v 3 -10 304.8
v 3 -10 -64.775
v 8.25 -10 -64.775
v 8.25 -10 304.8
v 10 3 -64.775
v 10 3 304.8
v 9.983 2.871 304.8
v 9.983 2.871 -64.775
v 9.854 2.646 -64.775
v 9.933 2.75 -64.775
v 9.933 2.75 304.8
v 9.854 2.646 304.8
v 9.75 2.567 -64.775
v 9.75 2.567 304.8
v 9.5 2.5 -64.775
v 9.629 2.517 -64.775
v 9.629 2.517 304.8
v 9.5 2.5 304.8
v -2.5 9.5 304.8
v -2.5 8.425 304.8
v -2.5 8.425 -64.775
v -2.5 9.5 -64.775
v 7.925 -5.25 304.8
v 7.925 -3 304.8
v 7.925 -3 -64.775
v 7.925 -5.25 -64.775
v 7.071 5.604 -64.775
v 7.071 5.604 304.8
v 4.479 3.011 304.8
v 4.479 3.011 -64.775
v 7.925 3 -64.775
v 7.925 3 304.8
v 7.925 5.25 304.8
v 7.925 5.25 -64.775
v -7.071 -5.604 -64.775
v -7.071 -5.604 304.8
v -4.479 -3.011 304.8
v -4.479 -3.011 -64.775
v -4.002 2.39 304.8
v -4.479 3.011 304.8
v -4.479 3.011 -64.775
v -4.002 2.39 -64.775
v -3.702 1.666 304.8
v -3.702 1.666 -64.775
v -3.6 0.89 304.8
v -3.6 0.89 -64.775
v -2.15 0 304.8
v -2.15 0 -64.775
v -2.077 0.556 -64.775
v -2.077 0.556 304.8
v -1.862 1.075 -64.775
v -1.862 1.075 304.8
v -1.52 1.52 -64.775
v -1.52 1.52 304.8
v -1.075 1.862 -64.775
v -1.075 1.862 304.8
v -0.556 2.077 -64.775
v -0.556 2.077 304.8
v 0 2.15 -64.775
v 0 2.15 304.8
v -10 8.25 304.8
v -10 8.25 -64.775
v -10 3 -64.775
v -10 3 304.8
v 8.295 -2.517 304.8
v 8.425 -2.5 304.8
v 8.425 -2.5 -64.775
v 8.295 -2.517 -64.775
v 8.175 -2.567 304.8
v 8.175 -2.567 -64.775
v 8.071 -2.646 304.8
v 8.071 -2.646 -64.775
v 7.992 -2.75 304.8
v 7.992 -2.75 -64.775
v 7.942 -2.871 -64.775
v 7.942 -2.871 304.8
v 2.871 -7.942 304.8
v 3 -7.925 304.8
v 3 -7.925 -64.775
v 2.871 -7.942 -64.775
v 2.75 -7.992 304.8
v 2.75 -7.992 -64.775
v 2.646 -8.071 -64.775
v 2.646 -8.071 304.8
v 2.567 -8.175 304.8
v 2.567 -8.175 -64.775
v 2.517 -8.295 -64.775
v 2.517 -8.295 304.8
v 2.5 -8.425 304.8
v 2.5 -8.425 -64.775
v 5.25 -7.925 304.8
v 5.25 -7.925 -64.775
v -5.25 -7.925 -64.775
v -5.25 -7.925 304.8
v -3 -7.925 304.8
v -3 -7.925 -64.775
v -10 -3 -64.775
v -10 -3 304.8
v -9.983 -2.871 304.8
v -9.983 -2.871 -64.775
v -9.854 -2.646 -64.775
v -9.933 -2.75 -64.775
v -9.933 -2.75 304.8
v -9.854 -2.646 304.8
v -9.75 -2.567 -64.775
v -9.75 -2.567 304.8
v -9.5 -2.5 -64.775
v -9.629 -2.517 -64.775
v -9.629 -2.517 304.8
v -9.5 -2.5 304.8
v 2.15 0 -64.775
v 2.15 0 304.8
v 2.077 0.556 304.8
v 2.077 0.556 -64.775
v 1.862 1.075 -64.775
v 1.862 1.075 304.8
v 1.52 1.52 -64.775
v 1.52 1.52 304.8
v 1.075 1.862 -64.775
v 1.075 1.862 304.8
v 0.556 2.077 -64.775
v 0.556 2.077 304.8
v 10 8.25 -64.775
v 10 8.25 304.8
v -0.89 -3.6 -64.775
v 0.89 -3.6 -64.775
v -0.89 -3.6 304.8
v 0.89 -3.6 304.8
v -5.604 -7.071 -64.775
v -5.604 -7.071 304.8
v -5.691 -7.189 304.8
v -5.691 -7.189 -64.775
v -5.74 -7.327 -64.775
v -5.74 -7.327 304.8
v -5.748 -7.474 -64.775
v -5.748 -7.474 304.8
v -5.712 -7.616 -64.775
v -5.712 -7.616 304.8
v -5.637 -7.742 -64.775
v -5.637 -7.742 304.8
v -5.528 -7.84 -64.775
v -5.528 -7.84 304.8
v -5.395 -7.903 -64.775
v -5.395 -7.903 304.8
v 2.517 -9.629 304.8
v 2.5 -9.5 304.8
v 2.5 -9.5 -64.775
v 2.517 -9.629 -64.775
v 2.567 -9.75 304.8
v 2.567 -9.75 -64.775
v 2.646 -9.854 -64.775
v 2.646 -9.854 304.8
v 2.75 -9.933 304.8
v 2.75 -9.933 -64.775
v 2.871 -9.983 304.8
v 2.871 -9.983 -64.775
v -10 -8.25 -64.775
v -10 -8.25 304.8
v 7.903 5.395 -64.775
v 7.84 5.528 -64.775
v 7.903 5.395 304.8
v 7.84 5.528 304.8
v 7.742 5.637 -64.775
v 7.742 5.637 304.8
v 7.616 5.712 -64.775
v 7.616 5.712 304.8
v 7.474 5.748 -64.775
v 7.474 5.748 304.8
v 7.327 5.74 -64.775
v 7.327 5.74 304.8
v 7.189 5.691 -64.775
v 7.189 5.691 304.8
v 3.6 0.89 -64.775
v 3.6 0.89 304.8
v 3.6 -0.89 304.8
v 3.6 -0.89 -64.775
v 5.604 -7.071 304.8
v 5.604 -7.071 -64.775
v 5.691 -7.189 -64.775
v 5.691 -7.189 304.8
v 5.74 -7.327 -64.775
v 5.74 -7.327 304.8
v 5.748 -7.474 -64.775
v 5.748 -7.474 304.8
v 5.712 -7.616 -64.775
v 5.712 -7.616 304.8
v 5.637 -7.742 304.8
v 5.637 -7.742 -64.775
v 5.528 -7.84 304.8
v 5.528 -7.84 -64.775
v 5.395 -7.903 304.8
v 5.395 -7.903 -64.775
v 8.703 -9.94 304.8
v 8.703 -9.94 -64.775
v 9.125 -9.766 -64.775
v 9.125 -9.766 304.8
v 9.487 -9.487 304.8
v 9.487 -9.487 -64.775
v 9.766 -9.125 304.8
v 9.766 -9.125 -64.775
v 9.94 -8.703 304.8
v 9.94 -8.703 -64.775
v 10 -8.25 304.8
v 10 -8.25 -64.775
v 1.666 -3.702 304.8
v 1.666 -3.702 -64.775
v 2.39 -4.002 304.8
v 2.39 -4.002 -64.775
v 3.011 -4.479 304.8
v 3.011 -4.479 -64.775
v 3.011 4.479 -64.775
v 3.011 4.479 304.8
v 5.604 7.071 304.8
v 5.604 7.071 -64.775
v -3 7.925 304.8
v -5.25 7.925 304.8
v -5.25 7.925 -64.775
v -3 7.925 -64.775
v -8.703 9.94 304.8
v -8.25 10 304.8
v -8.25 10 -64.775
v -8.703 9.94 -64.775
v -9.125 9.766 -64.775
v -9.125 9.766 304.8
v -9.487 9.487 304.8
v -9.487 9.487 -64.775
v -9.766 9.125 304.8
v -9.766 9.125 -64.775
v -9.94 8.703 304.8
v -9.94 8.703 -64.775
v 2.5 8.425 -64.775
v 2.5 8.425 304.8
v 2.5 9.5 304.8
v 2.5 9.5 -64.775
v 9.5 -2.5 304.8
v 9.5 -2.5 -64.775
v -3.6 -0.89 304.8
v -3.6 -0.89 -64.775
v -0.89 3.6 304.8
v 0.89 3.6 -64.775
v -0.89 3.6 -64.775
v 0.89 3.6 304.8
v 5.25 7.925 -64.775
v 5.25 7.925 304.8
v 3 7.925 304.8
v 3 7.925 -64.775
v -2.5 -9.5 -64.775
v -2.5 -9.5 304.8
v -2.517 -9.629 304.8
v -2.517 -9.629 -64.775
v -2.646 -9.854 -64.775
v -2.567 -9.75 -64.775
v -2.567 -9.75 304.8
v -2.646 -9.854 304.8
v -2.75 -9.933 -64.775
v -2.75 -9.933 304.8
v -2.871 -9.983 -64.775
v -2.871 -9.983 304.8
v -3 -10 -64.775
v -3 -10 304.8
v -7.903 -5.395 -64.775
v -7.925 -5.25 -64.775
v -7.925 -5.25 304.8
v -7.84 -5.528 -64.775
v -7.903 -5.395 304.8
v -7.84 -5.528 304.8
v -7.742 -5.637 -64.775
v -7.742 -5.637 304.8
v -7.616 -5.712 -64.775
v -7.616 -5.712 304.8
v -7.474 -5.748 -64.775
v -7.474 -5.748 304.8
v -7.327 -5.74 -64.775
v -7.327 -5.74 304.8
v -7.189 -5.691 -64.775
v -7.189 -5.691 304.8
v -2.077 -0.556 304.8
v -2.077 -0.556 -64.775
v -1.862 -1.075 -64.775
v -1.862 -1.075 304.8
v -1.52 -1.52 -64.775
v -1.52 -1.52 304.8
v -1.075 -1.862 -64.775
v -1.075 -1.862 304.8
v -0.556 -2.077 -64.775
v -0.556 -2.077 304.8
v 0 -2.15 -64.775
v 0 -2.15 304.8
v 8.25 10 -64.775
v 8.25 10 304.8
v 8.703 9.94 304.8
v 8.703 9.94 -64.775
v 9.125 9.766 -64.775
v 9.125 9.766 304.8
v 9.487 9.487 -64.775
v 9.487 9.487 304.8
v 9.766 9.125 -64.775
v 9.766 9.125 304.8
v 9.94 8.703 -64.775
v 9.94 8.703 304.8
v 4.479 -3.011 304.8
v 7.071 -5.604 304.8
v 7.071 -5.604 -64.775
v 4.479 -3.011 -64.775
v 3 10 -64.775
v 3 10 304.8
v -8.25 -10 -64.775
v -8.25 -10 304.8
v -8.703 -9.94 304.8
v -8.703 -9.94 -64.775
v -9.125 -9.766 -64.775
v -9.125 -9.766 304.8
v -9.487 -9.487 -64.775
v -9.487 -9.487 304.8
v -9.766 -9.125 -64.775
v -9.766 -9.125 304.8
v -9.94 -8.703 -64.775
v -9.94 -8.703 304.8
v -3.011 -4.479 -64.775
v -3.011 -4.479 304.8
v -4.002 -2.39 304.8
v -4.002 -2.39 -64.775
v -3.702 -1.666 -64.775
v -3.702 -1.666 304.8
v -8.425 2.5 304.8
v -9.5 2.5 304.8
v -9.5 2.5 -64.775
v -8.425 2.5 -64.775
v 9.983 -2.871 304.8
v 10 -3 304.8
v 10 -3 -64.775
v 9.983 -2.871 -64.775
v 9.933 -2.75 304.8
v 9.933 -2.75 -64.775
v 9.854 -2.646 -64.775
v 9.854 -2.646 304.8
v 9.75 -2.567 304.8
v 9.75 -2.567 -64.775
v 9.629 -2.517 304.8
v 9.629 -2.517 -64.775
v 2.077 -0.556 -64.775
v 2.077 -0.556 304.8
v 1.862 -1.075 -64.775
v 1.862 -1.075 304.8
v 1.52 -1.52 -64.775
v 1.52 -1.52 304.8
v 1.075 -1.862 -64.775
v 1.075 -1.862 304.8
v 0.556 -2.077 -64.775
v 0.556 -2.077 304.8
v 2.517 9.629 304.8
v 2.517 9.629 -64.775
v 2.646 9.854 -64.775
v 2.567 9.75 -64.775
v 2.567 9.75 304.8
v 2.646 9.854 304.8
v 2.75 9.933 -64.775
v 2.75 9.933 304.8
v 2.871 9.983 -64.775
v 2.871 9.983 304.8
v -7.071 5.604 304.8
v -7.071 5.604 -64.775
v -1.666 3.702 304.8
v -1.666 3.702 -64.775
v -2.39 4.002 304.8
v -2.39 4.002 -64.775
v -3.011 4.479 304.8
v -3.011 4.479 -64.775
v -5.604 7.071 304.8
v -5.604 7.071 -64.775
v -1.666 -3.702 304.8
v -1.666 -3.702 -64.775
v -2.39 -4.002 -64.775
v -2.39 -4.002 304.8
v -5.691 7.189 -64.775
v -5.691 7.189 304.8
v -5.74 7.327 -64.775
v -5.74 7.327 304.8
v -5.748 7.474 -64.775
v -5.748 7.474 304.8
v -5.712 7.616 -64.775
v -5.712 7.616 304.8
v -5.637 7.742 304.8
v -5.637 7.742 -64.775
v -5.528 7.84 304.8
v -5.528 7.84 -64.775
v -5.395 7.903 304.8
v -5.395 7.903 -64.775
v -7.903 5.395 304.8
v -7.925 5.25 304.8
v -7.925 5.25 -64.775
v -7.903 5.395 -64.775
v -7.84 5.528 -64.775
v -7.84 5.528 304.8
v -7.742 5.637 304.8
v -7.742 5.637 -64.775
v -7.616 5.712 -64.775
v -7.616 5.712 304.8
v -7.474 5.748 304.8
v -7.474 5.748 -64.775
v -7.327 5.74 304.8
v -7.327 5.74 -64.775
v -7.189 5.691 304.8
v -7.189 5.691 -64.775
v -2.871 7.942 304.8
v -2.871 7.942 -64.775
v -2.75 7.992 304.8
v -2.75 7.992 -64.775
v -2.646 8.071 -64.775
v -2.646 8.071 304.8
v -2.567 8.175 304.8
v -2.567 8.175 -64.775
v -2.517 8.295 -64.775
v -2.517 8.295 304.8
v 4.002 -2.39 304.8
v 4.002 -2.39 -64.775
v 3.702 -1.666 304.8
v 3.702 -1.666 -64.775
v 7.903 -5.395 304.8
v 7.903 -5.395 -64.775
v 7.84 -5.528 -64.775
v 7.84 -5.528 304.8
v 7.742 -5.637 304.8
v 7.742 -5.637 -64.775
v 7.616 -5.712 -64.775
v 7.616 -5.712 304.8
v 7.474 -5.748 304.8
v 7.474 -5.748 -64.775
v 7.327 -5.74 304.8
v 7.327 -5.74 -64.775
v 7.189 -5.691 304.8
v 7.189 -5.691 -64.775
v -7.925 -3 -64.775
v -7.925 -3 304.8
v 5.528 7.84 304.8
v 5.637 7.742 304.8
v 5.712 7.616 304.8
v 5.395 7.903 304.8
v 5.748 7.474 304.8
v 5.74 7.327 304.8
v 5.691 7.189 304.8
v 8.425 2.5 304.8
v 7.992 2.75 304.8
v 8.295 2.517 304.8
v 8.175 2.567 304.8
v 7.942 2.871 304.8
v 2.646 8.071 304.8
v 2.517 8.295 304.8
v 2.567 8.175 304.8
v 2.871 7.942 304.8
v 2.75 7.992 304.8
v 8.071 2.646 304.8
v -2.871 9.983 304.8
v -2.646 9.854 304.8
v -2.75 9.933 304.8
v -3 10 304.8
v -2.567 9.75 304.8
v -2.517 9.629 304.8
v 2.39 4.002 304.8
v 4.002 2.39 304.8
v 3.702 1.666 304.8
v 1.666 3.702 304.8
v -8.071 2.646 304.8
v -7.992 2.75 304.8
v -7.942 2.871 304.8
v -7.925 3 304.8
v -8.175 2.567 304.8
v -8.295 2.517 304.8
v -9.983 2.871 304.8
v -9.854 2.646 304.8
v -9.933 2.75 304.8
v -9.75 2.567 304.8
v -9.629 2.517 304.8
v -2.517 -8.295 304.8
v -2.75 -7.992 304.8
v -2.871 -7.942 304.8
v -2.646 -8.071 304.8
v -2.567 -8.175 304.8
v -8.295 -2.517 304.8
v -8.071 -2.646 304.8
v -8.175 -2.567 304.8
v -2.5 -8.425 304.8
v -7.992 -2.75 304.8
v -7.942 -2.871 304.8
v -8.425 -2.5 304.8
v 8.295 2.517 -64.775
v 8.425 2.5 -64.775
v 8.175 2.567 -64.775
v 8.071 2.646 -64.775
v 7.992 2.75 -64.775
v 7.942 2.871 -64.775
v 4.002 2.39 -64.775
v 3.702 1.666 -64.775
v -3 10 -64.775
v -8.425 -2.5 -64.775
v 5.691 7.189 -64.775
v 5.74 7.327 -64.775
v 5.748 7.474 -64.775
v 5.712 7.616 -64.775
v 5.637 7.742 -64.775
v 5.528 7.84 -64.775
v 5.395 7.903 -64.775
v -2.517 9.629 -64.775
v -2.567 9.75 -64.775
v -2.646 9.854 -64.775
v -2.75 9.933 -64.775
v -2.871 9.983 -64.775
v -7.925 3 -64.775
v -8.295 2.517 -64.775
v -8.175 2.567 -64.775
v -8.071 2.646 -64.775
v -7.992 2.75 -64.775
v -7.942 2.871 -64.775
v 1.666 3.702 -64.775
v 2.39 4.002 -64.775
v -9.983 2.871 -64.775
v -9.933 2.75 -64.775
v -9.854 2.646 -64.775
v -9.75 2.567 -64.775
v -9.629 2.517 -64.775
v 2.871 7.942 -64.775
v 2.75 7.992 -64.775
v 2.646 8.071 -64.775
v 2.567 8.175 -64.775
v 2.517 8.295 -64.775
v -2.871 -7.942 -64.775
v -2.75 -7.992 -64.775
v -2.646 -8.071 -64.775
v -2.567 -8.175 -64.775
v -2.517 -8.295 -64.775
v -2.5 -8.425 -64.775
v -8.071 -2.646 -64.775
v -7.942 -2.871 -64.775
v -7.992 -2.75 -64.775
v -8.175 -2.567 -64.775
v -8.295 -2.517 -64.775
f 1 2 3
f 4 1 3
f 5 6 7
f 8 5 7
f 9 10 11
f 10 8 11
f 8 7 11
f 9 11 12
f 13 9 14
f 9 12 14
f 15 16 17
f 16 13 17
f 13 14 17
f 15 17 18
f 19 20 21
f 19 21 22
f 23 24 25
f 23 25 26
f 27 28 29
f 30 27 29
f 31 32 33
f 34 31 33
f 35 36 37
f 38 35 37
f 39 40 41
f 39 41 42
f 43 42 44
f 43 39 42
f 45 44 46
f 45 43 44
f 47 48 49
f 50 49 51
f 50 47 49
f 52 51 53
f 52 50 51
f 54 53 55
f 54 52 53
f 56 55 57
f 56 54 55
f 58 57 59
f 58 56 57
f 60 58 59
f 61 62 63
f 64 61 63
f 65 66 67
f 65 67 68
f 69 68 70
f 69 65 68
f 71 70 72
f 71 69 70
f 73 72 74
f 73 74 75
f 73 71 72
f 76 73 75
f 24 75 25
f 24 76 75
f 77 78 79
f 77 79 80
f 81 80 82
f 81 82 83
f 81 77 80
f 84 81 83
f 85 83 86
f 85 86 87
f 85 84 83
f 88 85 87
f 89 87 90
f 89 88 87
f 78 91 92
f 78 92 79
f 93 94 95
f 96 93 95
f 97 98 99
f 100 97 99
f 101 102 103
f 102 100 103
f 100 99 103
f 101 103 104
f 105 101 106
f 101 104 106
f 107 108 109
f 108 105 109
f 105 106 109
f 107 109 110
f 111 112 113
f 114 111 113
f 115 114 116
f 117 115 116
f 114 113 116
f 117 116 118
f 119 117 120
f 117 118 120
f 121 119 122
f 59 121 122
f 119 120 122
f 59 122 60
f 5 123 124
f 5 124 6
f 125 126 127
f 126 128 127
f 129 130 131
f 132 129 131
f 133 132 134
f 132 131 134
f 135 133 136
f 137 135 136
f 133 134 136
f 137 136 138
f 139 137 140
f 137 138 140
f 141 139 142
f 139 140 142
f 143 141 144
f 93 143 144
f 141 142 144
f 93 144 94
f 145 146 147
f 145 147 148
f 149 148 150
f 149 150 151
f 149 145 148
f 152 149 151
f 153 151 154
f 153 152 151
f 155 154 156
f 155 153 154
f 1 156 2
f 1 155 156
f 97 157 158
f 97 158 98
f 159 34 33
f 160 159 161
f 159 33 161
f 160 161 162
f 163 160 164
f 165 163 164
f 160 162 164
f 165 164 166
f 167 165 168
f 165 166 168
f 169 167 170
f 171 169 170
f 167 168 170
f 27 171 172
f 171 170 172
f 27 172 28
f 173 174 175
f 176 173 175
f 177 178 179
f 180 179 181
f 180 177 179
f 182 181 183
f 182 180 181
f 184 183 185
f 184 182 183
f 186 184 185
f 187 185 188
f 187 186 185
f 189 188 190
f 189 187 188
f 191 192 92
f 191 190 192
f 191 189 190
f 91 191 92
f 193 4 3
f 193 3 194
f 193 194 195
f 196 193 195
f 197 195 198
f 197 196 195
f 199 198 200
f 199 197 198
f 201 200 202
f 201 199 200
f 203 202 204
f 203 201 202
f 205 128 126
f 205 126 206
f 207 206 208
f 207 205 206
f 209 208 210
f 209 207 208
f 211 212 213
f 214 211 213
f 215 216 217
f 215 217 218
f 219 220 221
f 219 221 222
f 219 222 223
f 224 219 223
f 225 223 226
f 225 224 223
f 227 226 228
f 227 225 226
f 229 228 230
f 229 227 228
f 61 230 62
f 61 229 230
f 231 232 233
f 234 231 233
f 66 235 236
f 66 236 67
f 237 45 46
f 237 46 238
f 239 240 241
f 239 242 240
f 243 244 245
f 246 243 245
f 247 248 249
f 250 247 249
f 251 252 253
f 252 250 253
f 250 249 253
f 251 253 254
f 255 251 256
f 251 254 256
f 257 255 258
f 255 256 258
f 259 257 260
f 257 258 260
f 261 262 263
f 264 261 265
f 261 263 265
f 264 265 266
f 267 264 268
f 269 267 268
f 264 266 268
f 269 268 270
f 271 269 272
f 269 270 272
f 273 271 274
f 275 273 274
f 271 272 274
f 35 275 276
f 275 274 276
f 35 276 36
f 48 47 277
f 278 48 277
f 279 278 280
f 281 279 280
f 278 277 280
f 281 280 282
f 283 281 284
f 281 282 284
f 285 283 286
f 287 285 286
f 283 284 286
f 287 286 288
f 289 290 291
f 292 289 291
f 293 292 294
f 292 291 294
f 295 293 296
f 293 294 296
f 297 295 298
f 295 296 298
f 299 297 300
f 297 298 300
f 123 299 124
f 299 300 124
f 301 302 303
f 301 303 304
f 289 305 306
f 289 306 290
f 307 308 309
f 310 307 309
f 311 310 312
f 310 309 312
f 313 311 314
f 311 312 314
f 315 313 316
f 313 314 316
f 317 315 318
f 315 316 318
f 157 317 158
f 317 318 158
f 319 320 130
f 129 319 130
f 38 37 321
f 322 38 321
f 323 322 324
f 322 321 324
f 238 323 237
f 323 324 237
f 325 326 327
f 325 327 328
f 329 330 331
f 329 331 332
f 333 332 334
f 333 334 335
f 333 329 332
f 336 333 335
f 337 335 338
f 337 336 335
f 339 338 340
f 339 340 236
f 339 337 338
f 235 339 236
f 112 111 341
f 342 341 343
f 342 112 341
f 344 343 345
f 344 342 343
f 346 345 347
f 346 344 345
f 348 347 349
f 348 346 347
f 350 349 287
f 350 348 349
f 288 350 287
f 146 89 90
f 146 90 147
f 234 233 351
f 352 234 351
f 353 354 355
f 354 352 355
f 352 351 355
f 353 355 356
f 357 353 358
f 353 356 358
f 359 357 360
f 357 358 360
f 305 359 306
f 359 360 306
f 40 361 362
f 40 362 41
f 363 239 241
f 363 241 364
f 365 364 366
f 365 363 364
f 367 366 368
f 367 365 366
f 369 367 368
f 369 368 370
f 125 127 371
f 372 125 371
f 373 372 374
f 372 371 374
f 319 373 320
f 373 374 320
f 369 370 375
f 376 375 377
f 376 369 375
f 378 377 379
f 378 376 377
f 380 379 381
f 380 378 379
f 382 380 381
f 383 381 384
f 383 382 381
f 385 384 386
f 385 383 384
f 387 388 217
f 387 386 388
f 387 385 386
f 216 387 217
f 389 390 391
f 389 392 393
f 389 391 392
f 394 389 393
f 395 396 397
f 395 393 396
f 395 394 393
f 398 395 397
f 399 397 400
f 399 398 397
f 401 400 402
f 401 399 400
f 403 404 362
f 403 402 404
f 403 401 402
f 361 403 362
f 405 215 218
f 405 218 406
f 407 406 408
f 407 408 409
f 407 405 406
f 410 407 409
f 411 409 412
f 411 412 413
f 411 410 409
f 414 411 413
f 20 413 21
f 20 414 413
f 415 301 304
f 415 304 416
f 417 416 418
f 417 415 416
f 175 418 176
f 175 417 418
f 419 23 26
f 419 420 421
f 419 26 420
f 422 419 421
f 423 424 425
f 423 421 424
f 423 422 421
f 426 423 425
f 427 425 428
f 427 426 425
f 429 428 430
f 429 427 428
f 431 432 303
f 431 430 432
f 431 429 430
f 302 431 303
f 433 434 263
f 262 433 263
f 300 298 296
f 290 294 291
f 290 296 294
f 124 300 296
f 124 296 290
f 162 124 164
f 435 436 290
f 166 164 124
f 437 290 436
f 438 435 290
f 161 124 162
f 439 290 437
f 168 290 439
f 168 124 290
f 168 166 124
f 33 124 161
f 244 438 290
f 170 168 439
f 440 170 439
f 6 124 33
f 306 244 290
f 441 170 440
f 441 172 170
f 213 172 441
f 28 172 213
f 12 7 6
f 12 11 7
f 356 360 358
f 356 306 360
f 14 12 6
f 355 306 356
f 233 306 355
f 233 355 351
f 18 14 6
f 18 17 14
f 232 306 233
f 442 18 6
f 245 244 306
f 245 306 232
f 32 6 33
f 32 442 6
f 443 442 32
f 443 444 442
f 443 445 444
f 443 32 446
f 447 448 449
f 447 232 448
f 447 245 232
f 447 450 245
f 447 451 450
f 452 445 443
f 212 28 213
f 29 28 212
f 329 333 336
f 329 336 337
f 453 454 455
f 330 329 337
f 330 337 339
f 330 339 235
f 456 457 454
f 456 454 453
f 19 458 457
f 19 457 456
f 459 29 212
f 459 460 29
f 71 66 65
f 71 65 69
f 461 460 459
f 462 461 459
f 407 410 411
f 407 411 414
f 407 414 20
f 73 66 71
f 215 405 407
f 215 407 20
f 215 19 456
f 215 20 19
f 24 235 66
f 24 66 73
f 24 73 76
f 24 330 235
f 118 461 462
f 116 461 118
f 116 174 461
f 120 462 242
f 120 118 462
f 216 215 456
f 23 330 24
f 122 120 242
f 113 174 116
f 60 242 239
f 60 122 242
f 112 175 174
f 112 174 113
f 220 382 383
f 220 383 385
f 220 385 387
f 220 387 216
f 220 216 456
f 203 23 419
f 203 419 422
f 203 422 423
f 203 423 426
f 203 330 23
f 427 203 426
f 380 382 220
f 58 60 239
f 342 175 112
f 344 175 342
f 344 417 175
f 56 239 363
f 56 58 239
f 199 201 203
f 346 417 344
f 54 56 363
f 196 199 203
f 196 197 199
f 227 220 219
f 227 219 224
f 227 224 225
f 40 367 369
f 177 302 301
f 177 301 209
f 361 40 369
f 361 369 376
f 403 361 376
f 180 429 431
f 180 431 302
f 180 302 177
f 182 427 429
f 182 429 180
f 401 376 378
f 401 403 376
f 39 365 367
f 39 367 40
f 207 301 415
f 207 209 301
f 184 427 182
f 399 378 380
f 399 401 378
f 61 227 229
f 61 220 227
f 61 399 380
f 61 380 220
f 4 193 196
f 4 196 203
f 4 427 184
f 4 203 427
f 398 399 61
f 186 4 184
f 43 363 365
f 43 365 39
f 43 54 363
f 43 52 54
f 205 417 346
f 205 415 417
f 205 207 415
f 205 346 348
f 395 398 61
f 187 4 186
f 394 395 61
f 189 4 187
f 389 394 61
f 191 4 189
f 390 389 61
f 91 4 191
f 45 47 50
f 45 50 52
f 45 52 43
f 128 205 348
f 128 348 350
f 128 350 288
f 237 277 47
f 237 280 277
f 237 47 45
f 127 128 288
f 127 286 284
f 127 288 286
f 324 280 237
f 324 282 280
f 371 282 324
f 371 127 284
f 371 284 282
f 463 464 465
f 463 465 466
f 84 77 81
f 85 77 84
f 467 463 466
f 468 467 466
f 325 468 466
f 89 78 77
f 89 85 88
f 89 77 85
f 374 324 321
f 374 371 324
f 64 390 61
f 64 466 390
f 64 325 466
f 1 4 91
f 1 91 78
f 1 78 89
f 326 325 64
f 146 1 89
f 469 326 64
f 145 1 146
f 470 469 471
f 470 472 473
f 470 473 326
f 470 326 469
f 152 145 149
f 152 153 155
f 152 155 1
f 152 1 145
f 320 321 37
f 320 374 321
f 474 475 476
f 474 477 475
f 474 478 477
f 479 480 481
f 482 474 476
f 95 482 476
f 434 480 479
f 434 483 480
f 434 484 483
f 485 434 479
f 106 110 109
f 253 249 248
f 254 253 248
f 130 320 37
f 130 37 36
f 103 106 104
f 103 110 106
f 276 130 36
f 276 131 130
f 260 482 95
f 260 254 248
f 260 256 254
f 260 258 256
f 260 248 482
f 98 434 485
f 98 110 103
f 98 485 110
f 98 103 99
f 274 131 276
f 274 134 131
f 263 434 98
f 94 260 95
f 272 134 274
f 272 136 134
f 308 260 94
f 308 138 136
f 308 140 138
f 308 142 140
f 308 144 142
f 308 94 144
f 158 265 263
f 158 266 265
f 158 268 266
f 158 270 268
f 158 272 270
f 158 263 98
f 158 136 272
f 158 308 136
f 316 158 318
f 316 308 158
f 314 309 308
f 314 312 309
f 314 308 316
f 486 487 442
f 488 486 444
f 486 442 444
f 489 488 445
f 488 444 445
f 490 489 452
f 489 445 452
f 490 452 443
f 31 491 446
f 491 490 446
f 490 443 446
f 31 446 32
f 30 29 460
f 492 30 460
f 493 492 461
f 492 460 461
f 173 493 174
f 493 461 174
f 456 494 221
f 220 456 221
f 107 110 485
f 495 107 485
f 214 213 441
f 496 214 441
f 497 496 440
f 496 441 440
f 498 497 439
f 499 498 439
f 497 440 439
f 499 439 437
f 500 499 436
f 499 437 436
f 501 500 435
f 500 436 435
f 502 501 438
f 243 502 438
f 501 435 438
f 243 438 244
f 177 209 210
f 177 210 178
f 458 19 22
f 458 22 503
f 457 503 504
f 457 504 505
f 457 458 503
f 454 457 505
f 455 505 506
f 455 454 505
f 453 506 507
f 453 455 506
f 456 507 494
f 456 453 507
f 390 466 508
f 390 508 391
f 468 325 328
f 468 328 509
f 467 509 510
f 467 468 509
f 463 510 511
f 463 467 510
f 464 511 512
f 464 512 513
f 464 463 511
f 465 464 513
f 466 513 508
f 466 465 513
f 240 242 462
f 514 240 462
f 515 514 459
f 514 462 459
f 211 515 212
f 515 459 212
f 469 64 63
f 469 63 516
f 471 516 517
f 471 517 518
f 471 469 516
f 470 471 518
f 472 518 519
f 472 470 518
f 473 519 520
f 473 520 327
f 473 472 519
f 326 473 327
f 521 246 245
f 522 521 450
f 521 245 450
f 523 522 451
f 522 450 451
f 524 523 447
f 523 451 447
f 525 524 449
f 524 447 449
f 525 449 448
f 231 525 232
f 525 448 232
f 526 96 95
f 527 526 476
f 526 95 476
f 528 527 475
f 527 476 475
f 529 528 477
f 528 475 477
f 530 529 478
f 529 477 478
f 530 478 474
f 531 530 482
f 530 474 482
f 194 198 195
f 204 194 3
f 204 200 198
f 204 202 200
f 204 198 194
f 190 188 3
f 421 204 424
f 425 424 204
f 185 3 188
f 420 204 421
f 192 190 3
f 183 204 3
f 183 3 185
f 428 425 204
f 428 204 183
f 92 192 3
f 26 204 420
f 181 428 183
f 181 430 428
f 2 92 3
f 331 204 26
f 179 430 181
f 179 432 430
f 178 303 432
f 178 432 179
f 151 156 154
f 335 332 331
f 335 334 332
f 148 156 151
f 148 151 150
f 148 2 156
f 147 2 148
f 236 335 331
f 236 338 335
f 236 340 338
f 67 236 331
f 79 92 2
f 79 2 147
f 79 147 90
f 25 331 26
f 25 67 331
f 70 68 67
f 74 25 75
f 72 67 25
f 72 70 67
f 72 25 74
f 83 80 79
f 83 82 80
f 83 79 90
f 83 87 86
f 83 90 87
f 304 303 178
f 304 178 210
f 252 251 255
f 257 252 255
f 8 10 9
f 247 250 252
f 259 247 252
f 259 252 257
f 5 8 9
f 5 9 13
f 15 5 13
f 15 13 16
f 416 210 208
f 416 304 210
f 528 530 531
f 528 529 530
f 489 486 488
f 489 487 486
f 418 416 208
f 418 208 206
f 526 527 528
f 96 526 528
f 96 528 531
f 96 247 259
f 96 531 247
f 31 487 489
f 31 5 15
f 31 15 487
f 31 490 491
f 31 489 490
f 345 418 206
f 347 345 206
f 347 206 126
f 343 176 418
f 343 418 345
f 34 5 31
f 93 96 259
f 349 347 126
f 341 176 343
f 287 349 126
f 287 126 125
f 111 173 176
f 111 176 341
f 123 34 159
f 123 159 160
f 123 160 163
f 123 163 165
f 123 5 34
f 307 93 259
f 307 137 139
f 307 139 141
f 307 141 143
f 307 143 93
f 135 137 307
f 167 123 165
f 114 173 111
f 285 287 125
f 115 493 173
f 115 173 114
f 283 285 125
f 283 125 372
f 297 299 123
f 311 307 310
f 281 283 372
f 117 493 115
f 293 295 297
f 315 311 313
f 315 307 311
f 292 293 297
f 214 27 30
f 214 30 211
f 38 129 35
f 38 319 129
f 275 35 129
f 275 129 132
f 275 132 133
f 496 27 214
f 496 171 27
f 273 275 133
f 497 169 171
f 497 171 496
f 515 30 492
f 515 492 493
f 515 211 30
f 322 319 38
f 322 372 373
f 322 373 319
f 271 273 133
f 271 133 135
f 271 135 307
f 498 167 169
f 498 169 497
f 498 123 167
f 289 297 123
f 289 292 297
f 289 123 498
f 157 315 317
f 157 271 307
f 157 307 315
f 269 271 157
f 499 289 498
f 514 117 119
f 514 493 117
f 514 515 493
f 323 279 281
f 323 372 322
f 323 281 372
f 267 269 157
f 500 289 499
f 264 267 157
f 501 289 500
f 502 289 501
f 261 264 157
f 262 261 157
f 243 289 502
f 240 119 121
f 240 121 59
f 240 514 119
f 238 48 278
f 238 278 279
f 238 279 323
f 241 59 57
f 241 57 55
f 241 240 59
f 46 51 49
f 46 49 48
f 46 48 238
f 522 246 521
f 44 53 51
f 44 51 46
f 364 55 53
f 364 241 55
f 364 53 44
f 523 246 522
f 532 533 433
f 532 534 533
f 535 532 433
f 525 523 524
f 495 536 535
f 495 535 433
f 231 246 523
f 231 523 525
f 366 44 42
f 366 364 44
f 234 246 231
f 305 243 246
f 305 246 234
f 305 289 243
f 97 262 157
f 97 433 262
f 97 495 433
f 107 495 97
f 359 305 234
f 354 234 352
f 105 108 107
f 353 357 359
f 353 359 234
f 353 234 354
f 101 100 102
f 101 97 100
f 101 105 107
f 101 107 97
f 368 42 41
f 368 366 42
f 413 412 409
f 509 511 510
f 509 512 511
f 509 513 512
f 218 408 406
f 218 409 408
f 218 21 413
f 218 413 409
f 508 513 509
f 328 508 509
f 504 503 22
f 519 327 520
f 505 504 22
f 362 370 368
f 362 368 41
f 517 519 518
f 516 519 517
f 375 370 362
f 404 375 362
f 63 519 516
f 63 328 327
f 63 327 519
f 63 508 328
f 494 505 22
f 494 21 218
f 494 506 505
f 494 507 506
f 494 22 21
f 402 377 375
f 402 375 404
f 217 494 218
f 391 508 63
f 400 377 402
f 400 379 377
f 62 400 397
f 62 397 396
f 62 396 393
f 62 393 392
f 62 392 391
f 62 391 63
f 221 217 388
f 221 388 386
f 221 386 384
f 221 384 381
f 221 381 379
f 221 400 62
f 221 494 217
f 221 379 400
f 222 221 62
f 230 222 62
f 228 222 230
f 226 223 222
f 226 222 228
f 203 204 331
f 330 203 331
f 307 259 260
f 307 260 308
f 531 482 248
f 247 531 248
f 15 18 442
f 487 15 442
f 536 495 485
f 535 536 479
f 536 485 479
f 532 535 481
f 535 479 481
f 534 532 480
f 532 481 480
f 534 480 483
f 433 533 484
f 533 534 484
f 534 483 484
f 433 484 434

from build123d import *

# Parameters (mm, degrees)
BOSS_EXTRUDE1_DEPTH = 304.8
SKETCH5_W           = 26.995197012
SKETCH5_H           = 24.68705749
CUT_EXTRUDE1_DEPTH  = 240.025


with BuildPart() as part:
    # Sketch4 → Boss-Extrude1 (new, symmetric)
    with BuildSketch(Plane.XY):
        with BuildLine():
            Line((3, -10), (8.25, -10))
            ThreePointArc((8.25, -10), (9.487436867, -9.487436867), (10, -8.25))
            Line((10, -8.25), (10, -3))
            ThreePointArc((10, -3), (9.853553391, -2.646446609), (9.5, -2.5))
            Line((9.5, -2.5), (8.424621202, -2.5))
            ThreePointArc((8.424621202, -2.5), (8.071067812, -2.646446609), (7.924621202, -3))
            Line((7.924621202, -3), (7.924621202, -5.25))
            ThreePointArc((7.924621202, -5.25), (7.615962919, -5.711939766), (7.071067812, -5.603553391))
            Line((7.071067812, -5.603553391), (4.478679656, -3.011165235))
            ThreePointArc((4.478679656, -3.011165235), (3.828361402, -2.037895189), (3.6, -0.889844892))
            Line((3.6, -0.889844892), (3.6, 0))
            Line((3.6, 0), (2.15, 0))
            ThreePointArc((2.15, 0), (1.52027958, -1.52027958), (0, -2.15))
            Line((0, -2.15), (0, -3.6))
            Line((0, -3.6), (0.889844892, -3.6))
            ThreePointArc((0.889844892, -3.6), (2.037895189, -3.828361402), (3.011165235, -4.478679656))
            Line((3.011165235, -4.478679656), (5.603553391, -7.071067812))
            ThreePointArc((5.603553391, -7.071067812), (5.711939766, -7.615962919), (5.25, -7.924621202))
            Line((5.25, -7.924621202), (3, -7.924621202))
            ThreePointArc((3, -7.924621202), (2.646446609, -8.071067812), (2.5, -8.424621202))
            Line((2.5, -8.424621202), (2.5, -9.5))
            ThreePointArc((2.5, -9.5), (2.646446609, -9.853553391), (3, -10))
        make_face()
    extrude(amount=BOSS_EXTRUDE1_DEPTH, both=True)

    # Mirror1: part across plane


with BuildPart() as part_1:
    add(part.part)
    add(part.part.mirror(Plane(origin=(0, 0, 0), x_dir=(0, 0, 1), z_dir=(1, 0, 0))))

    # Mirror2: part across plane


with BuildPart() as part_2:
    add(part_1.part)
    add(part_1.part.mirror(Plane.ZX))

    # Sketch5 → Cut-Extrude1 (cut)
    with BuildSketch(Plane(origin=(0, 0, -304.8), x_dir=(-1, 0, 0), z_dir=(0, 0, -1))):
        with Locations((-0.333544011, -0.025224209)):
            Rectangle(SKETCH5_W, SKETCH5_H)
    extrude(amount=-CUT_EXTRUDE1_DEPTH, mode=Mode.SUBTRACT)


solid = part_2.part
